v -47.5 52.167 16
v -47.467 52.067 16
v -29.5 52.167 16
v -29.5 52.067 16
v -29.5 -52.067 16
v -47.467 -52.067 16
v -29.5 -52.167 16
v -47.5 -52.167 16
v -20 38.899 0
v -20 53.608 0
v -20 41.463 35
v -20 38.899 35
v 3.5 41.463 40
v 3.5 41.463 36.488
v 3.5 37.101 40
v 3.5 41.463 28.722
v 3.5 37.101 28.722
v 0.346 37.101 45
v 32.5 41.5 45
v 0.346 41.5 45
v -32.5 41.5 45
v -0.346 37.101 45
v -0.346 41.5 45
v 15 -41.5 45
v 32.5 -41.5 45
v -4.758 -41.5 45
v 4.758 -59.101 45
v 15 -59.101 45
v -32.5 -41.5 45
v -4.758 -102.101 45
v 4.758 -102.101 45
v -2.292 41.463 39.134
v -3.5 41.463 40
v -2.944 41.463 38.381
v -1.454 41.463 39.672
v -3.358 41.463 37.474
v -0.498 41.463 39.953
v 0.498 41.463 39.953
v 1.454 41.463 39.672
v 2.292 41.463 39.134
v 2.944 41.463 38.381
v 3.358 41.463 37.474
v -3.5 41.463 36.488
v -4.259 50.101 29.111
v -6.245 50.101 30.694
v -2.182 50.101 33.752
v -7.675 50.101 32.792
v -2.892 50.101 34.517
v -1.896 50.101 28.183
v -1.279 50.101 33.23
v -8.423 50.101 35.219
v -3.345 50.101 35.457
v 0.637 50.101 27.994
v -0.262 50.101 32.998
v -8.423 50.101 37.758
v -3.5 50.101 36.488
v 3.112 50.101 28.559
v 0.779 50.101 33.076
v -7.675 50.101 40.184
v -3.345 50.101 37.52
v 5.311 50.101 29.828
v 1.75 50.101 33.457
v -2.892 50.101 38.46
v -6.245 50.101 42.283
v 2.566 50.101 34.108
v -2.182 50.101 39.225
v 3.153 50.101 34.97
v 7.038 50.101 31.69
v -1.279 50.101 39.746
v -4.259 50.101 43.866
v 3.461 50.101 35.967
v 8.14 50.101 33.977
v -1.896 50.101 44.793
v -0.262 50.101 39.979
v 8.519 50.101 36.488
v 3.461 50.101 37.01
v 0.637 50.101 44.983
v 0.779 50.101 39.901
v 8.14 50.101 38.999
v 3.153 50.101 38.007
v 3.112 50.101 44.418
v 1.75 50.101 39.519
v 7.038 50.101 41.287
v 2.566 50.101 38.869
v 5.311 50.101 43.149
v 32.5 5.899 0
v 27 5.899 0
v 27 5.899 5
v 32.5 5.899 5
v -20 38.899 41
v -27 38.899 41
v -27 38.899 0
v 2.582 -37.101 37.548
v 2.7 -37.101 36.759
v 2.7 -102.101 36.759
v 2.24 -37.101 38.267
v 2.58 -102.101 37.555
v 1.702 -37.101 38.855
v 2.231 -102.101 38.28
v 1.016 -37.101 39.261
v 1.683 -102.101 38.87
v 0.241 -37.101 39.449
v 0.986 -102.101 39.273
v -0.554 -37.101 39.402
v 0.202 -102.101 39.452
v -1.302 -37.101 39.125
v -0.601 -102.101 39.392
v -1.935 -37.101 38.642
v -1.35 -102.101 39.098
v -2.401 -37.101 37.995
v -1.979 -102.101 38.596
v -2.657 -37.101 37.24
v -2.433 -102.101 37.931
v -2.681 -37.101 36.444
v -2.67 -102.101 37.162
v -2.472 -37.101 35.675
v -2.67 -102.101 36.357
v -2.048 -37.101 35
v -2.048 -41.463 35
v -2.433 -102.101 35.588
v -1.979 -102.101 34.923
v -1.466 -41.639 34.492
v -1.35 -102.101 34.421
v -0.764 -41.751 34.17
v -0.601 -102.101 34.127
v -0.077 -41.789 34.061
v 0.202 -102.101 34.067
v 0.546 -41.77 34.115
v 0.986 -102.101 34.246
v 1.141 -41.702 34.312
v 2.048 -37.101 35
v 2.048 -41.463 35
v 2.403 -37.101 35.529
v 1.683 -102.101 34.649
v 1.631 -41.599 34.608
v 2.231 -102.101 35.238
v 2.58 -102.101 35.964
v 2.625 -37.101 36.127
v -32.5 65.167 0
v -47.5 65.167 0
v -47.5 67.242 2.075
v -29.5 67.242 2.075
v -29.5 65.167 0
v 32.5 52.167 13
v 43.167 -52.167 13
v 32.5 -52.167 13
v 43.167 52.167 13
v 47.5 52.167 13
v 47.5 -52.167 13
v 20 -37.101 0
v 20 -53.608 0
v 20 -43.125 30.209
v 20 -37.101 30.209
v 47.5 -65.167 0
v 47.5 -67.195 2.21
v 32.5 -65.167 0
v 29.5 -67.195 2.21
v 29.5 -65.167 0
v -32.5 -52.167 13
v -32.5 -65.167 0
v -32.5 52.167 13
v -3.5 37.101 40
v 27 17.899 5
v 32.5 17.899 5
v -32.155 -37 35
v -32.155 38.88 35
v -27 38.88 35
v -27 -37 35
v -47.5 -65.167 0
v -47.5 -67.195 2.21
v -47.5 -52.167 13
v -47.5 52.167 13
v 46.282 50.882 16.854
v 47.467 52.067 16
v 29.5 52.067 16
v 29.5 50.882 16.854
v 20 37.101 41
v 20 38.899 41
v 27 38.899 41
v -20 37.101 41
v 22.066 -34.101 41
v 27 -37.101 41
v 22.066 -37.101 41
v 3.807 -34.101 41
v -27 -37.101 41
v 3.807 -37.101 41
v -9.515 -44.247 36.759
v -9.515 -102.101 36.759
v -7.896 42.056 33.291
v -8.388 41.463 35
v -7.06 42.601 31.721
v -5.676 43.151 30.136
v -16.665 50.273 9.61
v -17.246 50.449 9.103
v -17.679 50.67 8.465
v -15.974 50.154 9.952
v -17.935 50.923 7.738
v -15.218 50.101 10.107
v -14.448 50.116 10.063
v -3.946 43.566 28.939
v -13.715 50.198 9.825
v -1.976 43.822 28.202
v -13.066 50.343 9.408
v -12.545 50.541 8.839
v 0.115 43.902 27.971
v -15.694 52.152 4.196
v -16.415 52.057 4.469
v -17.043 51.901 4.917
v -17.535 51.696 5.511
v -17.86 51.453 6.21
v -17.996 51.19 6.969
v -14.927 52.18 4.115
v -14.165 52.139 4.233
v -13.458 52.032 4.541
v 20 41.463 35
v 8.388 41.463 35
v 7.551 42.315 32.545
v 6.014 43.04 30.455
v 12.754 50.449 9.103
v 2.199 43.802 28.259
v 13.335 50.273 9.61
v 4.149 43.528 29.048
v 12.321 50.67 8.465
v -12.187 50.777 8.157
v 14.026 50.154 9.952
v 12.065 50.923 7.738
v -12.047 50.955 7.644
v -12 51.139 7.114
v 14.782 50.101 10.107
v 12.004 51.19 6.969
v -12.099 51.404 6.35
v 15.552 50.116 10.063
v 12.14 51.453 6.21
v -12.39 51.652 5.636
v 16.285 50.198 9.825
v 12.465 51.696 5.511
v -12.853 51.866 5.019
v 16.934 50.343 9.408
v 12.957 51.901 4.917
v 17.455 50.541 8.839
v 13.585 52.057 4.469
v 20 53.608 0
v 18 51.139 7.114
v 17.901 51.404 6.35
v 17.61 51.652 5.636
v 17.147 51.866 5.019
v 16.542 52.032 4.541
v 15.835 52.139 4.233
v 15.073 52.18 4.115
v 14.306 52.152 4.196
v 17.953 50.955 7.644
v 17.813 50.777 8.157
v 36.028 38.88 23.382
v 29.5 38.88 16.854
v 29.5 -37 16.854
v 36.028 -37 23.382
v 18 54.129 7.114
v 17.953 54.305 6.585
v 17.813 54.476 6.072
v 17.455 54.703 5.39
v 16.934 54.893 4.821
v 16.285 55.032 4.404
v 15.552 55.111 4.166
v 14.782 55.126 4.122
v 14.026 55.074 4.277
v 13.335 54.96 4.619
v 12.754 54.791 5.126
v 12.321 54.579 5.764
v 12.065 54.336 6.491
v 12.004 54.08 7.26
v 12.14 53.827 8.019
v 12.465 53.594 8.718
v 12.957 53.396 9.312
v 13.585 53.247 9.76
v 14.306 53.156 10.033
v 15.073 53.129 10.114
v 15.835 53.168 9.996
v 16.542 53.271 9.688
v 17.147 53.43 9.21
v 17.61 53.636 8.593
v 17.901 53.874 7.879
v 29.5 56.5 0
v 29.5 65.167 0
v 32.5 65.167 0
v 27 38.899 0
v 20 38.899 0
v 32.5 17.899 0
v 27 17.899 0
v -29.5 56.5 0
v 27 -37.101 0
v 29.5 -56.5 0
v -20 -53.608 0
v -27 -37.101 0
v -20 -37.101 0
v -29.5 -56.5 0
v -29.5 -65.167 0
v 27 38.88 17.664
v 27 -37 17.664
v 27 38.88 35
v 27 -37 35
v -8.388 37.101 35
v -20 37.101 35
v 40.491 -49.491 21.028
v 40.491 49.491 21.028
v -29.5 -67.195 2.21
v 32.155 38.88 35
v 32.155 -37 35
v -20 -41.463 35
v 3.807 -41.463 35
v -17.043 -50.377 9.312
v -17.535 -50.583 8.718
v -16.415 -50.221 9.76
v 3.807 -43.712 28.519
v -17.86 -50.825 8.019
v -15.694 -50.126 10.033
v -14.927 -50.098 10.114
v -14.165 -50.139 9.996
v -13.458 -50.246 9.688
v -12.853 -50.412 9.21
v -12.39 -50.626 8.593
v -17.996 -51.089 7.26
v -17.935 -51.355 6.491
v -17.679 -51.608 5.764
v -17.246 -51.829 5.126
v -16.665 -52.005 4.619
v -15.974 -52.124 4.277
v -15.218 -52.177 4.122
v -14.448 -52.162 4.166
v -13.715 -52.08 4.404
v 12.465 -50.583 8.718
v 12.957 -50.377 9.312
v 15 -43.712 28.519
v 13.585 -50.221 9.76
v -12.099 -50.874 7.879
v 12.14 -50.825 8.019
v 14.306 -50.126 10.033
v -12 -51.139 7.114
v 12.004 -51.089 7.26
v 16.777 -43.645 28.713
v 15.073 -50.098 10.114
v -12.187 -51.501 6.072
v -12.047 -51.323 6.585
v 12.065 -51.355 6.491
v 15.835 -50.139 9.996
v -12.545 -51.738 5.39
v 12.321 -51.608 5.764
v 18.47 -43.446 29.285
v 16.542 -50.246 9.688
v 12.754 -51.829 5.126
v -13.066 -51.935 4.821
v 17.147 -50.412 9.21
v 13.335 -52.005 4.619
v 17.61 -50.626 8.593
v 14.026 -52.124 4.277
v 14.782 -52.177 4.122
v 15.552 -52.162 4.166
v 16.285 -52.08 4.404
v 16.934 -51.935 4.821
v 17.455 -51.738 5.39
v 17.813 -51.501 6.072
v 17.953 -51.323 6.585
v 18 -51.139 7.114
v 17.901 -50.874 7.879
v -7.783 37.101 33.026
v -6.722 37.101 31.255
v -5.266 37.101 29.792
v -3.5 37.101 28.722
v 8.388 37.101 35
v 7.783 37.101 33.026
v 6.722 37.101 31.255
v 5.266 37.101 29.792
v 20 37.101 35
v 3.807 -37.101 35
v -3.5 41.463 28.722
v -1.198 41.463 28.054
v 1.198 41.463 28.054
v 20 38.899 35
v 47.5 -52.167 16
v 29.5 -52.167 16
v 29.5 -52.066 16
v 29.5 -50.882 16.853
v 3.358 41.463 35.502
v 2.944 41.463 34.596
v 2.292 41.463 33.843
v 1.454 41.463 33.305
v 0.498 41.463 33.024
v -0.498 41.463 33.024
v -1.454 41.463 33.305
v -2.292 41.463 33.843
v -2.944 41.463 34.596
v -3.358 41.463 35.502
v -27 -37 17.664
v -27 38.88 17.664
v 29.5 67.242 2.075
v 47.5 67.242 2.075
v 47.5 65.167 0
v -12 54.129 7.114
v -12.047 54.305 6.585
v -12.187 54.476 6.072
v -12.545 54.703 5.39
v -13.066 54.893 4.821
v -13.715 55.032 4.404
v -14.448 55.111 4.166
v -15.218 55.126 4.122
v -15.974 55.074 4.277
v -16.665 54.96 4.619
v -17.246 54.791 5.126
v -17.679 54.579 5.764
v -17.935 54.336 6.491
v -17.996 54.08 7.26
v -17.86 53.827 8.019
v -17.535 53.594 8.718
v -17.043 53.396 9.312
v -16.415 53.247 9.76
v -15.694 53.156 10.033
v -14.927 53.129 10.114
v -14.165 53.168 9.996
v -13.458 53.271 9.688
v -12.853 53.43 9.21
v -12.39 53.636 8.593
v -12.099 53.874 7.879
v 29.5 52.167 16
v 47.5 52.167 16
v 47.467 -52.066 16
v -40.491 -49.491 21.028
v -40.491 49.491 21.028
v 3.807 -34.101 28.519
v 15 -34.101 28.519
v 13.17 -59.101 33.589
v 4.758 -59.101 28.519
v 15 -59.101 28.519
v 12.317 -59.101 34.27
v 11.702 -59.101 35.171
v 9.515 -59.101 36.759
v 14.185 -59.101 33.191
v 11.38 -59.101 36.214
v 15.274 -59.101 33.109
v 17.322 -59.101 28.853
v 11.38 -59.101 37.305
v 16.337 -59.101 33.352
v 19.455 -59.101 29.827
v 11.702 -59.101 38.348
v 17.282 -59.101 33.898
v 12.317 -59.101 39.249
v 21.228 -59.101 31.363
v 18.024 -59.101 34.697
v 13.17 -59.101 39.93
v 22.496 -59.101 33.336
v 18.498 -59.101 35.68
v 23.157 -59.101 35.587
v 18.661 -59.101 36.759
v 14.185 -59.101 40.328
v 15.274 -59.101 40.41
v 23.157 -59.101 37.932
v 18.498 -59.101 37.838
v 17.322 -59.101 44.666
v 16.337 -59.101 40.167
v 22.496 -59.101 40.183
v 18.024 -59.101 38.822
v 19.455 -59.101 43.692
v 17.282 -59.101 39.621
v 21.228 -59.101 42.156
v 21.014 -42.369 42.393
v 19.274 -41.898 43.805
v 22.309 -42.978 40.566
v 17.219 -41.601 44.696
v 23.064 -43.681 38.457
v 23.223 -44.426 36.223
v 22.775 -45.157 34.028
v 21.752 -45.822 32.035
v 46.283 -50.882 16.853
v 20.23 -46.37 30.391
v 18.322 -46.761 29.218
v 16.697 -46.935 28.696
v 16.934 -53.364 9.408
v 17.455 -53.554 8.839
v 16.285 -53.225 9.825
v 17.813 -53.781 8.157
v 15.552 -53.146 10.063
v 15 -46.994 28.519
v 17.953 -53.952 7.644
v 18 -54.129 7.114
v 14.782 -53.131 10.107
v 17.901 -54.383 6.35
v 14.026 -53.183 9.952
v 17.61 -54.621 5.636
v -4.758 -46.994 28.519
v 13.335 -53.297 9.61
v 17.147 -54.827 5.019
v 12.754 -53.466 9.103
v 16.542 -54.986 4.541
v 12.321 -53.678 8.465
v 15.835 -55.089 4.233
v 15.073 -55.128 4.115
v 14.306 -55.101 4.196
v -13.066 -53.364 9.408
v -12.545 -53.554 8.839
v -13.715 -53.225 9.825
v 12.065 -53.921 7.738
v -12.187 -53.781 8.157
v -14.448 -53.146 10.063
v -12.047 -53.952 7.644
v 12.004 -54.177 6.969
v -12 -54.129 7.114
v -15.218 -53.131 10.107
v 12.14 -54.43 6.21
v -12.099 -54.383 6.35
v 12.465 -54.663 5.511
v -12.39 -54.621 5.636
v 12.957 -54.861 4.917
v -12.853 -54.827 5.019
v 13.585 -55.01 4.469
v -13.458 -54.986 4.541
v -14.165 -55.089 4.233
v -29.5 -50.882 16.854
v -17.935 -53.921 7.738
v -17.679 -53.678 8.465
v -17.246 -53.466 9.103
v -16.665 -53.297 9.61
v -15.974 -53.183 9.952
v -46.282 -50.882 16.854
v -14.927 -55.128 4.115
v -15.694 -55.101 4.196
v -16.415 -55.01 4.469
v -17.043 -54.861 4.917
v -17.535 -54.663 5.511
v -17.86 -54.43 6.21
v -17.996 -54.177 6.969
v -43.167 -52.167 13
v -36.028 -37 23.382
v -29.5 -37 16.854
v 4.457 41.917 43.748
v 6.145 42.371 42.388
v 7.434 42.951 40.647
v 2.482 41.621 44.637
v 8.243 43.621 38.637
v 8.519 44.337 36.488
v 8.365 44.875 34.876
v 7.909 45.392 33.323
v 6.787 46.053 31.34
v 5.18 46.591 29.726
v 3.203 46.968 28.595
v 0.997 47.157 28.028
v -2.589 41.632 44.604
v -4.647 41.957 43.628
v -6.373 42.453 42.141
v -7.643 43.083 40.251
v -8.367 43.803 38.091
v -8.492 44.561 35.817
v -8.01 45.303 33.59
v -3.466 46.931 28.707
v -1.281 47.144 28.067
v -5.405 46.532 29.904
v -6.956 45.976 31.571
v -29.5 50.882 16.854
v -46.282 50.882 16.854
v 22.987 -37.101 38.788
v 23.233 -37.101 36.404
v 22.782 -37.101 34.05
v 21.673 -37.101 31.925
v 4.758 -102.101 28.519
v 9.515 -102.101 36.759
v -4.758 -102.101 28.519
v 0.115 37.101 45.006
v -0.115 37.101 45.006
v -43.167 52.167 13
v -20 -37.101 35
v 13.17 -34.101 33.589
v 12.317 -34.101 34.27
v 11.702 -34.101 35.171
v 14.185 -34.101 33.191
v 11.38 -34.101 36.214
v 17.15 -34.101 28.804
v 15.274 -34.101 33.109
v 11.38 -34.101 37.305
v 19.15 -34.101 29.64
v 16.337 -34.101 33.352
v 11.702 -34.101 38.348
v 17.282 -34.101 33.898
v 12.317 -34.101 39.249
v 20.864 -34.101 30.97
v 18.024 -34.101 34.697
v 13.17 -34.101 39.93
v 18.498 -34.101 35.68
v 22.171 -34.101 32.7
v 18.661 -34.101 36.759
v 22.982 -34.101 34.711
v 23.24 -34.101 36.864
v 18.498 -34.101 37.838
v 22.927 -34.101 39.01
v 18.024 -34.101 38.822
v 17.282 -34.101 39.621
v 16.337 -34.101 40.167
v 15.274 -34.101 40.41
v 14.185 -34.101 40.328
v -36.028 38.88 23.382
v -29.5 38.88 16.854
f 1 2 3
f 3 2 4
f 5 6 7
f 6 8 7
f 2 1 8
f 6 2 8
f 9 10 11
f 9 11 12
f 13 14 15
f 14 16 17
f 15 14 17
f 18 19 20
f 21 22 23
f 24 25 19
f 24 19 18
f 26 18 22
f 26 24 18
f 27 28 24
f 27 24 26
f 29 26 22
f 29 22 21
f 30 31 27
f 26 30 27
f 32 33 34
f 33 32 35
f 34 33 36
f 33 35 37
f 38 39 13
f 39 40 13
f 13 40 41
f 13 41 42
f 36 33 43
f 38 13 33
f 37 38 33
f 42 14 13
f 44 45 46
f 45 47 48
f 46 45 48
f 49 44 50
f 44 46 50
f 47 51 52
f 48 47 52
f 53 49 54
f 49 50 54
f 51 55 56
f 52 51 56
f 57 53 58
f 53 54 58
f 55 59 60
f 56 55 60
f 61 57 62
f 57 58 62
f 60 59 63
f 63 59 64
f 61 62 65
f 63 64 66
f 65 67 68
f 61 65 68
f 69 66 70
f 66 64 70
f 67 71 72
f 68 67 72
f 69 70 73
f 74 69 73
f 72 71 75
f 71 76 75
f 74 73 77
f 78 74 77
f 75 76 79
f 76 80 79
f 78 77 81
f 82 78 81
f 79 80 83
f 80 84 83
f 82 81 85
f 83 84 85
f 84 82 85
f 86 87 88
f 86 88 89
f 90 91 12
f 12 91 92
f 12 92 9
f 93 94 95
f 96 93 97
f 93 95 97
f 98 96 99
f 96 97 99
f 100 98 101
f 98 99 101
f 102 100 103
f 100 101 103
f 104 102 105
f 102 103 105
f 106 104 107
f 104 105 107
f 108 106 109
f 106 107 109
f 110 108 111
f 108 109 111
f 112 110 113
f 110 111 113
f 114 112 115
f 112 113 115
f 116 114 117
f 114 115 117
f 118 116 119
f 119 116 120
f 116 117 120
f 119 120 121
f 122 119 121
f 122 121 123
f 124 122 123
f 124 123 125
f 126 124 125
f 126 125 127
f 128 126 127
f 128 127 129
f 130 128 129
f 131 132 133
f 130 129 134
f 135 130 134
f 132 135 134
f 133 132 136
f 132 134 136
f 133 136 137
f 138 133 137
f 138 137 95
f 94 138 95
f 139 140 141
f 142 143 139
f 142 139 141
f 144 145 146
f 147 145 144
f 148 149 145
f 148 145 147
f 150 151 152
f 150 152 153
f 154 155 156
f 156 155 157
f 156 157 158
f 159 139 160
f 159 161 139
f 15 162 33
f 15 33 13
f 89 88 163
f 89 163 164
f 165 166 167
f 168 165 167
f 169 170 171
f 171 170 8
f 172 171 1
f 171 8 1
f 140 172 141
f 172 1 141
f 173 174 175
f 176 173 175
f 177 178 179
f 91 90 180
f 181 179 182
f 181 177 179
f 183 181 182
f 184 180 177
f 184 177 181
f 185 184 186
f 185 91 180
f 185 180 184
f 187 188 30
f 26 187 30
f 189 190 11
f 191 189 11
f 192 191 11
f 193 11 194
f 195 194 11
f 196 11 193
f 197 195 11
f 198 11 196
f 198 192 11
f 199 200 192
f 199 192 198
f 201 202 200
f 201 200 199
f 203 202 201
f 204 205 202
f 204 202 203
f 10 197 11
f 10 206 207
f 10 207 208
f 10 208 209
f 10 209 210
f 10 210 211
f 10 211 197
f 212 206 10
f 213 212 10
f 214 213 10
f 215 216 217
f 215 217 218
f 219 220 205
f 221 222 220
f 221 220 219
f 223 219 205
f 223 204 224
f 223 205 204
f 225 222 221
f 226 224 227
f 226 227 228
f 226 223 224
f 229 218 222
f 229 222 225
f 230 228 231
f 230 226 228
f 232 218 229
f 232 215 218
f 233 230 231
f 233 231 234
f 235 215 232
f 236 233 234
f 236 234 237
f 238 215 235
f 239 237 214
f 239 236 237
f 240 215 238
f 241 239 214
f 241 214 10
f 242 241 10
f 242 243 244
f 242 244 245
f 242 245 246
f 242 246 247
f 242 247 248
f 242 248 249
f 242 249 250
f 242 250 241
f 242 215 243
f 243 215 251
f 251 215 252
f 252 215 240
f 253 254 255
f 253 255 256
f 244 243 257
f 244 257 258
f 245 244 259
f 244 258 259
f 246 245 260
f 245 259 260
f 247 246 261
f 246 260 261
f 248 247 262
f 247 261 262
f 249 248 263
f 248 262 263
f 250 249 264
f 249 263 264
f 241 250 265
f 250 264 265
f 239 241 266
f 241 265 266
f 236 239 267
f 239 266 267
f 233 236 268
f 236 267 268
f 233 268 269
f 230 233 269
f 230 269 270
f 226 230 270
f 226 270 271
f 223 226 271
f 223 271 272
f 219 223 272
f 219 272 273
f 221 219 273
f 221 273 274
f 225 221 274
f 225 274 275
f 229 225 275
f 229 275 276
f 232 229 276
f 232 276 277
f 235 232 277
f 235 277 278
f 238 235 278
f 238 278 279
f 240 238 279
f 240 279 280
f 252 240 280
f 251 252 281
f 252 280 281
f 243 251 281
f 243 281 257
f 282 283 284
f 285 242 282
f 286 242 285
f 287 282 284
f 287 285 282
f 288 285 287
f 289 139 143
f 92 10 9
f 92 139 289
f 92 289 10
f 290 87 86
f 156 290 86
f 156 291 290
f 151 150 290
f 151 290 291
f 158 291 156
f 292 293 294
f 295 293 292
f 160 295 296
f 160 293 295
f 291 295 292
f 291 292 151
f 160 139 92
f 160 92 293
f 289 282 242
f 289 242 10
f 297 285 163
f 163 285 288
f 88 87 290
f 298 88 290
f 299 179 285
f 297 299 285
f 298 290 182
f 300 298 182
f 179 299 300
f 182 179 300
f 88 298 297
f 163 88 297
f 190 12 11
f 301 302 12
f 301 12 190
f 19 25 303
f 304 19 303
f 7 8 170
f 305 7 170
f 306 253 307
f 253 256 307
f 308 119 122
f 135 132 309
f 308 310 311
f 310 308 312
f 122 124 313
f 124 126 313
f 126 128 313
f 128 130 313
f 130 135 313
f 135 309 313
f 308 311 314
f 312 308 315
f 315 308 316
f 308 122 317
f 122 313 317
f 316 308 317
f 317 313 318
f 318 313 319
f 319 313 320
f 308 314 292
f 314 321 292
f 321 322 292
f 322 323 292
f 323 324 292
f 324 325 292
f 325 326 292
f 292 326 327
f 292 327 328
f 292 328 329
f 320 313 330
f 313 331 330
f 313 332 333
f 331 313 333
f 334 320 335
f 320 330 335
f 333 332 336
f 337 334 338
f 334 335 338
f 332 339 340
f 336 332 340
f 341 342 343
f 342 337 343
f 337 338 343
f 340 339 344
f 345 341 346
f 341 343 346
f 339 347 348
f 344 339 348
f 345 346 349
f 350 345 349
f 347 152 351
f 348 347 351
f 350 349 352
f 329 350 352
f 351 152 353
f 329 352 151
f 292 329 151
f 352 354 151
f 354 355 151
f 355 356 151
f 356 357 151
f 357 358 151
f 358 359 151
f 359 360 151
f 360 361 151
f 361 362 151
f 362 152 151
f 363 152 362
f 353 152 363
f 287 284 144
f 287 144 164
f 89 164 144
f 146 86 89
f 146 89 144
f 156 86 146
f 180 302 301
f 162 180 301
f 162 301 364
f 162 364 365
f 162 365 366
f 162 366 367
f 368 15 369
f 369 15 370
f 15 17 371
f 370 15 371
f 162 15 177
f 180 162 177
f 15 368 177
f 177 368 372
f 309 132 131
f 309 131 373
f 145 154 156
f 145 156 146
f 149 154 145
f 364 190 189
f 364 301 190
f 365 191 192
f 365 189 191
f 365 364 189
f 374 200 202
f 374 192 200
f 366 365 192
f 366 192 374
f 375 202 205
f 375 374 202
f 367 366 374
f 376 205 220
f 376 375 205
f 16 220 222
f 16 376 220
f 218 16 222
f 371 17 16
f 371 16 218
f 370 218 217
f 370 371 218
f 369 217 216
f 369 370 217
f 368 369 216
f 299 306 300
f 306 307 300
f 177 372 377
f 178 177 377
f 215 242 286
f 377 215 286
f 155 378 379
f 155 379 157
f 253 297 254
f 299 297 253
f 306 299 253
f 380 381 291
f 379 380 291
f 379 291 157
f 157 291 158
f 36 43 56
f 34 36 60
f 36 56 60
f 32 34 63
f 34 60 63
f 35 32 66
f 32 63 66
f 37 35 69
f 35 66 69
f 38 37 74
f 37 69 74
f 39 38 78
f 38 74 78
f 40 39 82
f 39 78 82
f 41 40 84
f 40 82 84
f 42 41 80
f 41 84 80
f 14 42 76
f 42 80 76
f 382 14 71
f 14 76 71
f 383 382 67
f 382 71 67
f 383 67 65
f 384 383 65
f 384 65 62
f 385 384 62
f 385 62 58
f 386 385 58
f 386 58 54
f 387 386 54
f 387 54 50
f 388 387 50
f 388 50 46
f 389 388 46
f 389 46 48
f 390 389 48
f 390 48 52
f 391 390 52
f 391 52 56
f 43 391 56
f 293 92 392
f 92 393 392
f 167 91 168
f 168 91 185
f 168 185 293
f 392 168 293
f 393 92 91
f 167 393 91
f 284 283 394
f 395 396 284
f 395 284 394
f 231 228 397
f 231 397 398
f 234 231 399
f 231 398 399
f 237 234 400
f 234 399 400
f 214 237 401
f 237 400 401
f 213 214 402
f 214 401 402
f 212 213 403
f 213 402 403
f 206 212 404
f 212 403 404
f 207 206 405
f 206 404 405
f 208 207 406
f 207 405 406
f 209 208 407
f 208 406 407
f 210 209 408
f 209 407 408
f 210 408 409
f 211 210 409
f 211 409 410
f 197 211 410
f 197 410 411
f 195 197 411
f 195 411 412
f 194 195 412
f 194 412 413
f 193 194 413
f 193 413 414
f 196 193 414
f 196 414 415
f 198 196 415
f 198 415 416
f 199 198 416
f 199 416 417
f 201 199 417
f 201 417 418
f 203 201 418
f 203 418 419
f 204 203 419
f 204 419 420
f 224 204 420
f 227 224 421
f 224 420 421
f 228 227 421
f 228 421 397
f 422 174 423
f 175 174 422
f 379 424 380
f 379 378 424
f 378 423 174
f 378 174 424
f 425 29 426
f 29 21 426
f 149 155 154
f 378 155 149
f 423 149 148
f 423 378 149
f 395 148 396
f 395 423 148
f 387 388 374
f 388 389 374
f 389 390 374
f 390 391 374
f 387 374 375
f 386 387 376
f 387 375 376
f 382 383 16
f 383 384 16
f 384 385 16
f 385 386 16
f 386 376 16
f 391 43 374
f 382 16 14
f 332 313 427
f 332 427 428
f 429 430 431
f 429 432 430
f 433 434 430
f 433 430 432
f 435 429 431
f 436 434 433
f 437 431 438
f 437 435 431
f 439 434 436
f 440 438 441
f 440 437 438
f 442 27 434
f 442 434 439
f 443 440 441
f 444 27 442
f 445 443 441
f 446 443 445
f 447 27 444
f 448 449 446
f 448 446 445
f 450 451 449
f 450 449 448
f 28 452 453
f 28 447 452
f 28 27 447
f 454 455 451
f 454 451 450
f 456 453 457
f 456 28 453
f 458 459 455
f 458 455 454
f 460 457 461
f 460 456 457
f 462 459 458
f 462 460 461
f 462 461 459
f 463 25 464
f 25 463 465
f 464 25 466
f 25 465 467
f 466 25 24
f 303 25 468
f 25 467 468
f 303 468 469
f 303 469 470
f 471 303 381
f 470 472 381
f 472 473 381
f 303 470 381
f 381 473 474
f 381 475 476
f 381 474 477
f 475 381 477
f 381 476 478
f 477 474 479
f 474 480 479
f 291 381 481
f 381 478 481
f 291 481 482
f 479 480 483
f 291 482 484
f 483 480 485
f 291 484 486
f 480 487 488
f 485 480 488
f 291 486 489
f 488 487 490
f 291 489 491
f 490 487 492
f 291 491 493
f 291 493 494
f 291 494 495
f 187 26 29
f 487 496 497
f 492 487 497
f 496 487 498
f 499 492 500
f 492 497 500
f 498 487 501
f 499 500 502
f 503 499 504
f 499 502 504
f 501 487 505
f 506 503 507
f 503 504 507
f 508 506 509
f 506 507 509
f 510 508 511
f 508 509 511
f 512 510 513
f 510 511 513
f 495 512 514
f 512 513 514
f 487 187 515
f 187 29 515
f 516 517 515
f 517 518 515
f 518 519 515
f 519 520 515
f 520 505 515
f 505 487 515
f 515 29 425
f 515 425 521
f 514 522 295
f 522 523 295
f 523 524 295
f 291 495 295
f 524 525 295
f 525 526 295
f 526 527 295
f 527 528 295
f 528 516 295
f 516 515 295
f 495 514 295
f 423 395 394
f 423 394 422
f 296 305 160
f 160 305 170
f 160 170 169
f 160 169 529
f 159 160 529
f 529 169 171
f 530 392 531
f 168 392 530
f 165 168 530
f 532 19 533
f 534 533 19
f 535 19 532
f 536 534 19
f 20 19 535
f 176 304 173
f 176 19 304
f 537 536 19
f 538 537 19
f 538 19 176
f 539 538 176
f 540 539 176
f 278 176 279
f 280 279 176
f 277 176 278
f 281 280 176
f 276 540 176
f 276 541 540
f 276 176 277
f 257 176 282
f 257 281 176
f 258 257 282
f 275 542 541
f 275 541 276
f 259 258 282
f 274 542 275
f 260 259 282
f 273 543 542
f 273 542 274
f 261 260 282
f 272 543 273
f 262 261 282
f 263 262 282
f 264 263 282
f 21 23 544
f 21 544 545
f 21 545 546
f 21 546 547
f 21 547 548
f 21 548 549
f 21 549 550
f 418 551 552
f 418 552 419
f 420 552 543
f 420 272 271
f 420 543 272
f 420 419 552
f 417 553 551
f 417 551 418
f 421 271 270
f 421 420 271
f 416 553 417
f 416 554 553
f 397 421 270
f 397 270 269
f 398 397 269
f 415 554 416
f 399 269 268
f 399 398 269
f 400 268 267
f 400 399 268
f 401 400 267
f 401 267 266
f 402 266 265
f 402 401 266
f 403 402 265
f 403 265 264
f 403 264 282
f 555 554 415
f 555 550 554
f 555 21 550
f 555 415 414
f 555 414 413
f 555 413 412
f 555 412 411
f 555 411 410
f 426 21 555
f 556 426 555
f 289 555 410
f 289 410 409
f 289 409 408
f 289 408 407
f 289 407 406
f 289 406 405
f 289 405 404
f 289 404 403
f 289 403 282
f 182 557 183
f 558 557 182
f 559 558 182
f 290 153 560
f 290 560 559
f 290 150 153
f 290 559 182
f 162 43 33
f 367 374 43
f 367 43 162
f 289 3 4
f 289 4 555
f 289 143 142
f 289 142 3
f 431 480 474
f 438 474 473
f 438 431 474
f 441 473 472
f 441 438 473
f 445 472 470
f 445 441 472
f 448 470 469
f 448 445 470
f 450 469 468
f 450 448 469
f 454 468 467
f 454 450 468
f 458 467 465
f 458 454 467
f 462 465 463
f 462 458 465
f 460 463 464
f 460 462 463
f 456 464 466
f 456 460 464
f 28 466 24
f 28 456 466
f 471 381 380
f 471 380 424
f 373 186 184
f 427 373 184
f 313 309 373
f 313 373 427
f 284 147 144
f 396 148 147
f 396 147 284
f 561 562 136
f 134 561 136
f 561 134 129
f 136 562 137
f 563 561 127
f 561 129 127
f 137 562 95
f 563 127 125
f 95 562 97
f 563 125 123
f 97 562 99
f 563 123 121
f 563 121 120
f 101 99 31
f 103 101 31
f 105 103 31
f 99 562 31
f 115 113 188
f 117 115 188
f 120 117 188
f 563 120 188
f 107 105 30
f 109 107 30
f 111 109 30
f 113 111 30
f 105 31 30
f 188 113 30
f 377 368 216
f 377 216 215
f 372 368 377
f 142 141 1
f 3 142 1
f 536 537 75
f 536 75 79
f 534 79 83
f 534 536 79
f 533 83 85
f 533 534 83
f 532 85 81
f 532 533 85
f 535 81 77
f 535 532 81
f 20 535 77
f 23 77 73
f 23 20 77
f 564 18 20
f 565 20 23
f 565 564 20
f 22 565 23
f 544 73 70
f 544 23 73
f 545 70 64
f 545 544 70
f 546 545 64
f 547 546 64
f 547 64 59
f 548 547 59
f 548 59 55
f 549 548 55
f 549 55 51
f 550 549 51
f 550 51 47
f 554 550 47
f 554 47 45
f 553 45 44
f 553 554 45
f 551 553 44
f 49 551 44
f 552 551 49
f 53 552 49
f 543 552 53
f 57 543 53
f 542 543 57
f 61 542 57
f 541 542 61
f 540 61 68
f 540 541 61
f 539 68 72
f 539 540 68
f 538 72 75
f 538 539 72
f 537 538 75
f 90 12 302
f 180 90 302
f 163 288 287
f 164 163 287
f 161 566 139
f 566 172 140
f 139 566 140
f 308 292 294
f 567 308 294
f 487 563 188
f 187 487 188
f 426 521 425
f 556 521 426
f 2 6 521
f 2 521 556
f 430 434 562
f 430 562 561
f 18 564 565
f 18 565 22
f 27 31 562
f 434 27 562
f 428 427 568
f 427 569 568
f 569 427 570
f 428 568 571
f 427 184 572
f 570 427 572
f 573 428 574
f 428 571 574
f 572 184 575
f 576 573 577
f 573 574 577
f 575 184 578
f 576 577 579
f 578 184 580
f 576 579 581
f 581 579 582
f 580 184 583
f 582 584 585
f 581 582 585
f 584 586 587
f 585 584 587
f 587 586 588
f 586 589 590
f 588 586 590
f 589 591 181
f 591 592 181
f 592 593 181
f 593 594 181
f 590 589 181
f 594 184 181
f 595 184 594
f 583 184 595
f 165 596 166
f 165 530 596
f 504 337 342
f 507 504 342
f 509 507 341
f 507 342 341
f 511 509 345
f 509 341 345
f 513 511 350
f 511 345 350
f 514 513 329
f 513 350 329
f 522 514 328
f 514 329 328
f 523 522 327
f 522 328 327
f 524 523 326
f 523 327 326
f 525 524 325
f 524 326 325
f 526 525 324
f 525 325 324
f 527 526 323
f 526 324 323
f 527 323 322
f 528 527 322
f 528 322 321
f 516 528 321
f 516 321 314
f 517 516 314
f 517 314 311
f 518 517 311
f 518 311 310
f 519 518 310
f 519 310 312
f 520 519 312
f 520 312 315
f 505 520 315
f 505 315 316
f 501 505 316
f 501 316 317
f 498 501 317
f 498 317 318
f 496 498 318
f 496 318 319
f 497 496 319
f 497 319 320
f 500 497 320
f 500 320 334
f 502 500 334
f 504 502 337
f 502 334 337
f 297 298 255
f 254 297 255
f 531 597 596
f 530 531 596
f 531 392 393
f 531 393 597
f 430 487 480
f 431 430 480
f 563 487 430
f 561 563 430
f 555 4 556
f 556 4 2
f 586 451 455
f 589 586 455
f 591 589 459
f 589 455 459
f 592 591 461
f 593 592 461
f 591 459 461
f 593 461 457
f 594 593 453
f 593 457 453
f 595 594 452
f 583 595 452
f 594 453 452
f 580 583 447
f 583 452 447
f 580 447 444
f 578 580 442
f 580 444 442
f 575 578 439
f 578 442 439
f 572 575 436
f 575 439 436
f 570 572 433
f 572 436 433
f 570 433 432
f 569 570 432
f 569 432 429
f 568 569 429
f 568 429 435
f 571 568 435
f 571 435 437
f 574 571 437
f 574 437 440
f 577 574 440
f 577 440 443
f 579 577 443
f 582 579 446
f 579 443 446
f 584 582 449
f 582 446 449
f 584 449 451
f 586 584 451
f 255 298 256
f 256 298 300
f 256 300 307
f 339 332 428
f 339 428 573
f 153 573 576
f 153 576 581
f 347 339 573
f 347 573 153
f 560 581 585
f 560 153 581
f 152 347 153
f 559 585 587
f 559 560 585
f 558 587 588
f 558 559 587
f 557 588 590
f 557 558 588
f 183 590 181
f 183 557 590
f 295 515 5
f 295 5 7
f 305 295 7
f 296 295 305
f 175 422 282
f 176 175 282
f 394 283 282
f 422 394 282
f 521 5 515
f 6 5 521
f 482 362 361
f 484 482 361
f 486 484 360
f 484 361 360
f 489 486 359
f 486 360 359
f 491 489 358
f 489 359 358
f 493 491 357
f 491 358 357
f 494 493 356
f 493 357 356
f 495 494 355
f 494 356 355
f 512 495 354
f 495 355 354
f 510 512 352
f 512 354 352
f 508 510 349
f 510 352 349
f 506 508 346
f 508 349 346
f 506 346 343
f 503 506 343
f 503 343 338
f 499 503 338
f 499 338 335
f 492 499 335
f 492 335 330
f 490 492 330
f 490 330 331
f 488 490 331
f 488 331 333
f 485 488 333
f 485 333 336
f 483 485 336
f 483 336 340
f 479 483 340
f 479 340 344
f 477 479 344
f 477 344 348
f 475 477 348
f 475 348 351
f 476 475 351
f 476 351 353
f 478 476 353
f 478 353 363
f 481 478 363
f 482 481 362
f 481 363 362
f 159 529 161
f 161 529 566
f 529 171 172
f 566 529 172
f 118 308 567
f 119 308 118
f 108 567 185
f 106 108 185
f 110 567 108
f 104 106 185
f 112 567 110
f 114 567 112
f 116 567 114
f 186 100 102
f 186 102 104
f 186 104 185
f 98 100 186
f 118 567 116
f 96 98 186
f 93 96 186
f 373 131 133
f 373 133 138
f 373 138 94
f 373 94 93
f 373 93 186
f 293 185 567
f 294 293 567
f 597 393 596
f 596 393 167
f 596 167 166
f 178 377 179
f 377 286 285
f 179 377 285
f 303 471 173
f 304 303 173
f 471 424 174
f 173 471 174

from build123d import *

# Parameters (mm, degrees)
SKETCH_W             = 65
SKETCH_H             = 83
PAD_DEPTH            = 45
SKETCH001_W          = 83
SKETCH001_H          = 32
PAD001_DEPTH         = 15
PAD002_DEPTH         = 15
POCKET_DEPTH         = 403.6691065481
POCKET001_DEPTH      = 500
POCKET001_DEPTH_BACK = 100
PAD003_DEPTH         = 16
SKETCH007_W          = 3
SKETCH007_H          = 135.5960614908
PAD004_DEPTH         = 16
POCKET002_DEPTH      = 414.7315387876
POCKET003_DEPTH      = 5
SKETCH008_W          = 54
SKETCH008_H          = 76
POCKET004_DEPTH      = 35
PAD005_DEPTH         = 65
CHAMFER_SIZE         = 5.3
CHAMFER001_SIZE      = 5.3
CHAMFER002_SIZE      = 0.8999
CHAMFER003_SIZE      = 0.899
CHAMFER004_SIZE      = 0.8999
CHAMFER005_SIZE      = 0.8999
POCKET005_DEPTH      = 80.0010001
POCKET006_DEPTH      = 80.0010001
POCKET007_DEPTH      = 10000
POCKET007_DEPTH_BACK = 100
POCKET008_DEPTH      = 95.001
SKETCH012_W          = 5.5
SKETCH012_H          = 12
POCKET009_DEPTH      = 5
POCKET010_DEPTH      = 20
POCKET010_DEPTH_BACK = 20
POCKET011_DEPTH      = 6
SKETCH014_R          = 8.518625
PAD006_DEPTH         = 13
SKETCH015_R          = 3.5
POCKET012_DEPTH      = 15
SKETCH016_R          = 0.75
POCKET013_DEPTH      = 40
SKETCH018_W          = 5.5
SKETCH018_H          = 12
POCKET014_DEPTH      = 5
POCKET014_FACE131_W  = 12
POCKET014_FACE131_H  = 5.5
PAD007_DEPTH         = 5
POCKET015_DEPTH      = 38.88
POCKET015_DEPTH_BACK = 37
SKETCH020_R          = 3
POCKET016_DEPTH      = 173.1015589479
SKETCH021_R          = 2.7
POCKET017_DEPTH      = 70
SKETCH022_R          = 3.6
PAD008_DEPTH         = 25
SKETCH023_R          = 3.660532
POCKET018_DEPTH      = 25
SKETCH024_W          = 7
SKETCH024_H          = 6.387993
POCKET019_DEPTH      = 40


with BuildPart() as part:
    # Sketch → Pad (new body)
    with BuildSketch(Plane.XY):
        Rectangle(SKETCH_W, SKETCH_H)
    extrude(amount=PAD_DEPTH)

    # Sketch001 (on Face4 of Pad) → Pad001 (join)
    with BuildSketch(Plane(origin=(-32.5, 0, 0), x_dir=(0, -1, 0), z_dir=(-1, 0, 0))):
        with Locations((0, 29)):
            Rectangle(SKETCH001_W, SKETCH001_H)
    pad001 = extrude(amount=PAD001_DEPTH)

    # Mirrored: Pad001 across YZ
    add(pad001.mirror(Plane.YZ))

    # Sketch002 (on Face4 of Mirrored) → Pad002 (join)
    with BuildSketch(Plane.XZ.offset(41.5)):
        Polygon((-47.5, 45), (47.5, 45), (47.5, 13), (32.5, 13), (32.5, 0), (-32.5, 0), (-32.5, 13), (-47.5, 13), align=None)
    pad002 = extrude(amount=PAD002_DEPTH)

    # Mirrored001: Pad002 across XZ
    add(pad002.mirror(Plane.XZ))

    # Sketch003 (on Face13 of Mirrored001) → Pocket (cut, through all)
    with BuildSketch(Plane(origin=(-47.5, 0, 0), x_dir=(0, -1, 0), z_dir=(-1, 0, 0))):
        Polygon((41.5, 45), (56.5, 0), (69.973511, 50.863071), align=None)
    pocket = extrude(amount=-POCKET_DEPTH, mode=Mode.SUBTRACT)

    # Mirrored002: Pocket across XZ
    add(pocket.mirror(Plane.XZ), mode=Mode.SUBTRACT)

    # Sketch004 → Pocket001 (cut, two sides)
    with BuildSketch(Plane.XZ) as pocket001_sk:
        Polygon((-32.5, 45), (-47.5, 0), (-68.972275, 31.059837), (-58.790833, 51.045628), align=None)
    pocket001 = extrude(amount=-POCKET001_DEPTH, mode=Mode.SUBTRACT) + extrude(pocket001_sk.sketch, amount=POCKET001_DEPTH_BACK, mode=Mode.SUBTRACT)

    # Mirrored003: Pocket001 across YZ
    add(pocket001.mirror(Plane.YZ), mode=Mode.SUBTRACT)

    # Sketch006 (on DatumPlane) → Pad003 (join)
    with BuildSketch(Plane(origin=(-47.5, 0, 4), x_dir=(0, -1, 0), z_dir=(-1, 0, 0))):
        Polygon((-68.401131891, -2.9951612268), (-52.1666666667, 12), (52.1666666667, 12), (67.1949295998, -1.7895363668), (65.1666666666, -4), (52.1666666667, 9), (-52.1666666667, 9), (-66.3655953138, -5.1989286472), align=None)
    pad003 = extrude(amount=-PAD003_DEPTH)

    # Sketch007 (on Face8 of Pad003) → Pad004 (join)
    with BuildSketch(Plane(origin=(0, 0, 0), x_dir=(1, 0, 0), z_dir=(0, 0, -1))):
        with Locations((-31, -0.6031011456)):
            Rectangle(SKETCH007_W, SKETCH007_H)
    pad004 = extrude(amount=-PAD004_DEPTH)

    # Pad004 Face41 → Pocket002 (cut, through all)
    with BuildSketch(Plane(origin=(-32.5, 62.9896434829, 11.0016129244), x_dir=(0, 1, 0), z_dir=(-1, 0, 0))):
        Polygon((5.4114884081, -4.9983870756), (5.4114884081, 9.9967741512), (-10.8229768162, -4.9983870756), align=None)
    pocket002 = extrude(amount=-POCKET002_DEPTH, mode=Mode.SUBTRACT)

    # Pocket002 Face27 → Pocket003 (cut)
    with BuildSketch(Plane(origin=(-32.5, -62.1855086221, 11.4034878777), x_dir=(0, 1, 0), z_dir=(-1, 0, 0))):
        Polygon((10.0188419554, -4.5965121223), (-5.0094209777, 9.1930242445), (-5.0094209777, -4.5965121223), align=None)
    pocket003 = extrude(amount=-POCKET003_DEPTH, mode=Mode.SUBTRACT)

    # Mirrored004: Pad003 across YZ
    add(pad003.mirror(Plane.YZ))

    # Mirrored005: Pad004 across YZ
    add(pad004.mirror(Plane.YZ))

    # Mirrored006: Pocket002 across YZ
    add(pocket002.mirror(Plane.YZ), mode=Mode.SUBTRACT)

    # Mirrored007: Pocket003 across YZ
    add(pocket003.mirror(Plane.YZ), mode=Mode.SUBTRACT)

    # Sketch008 (on Face8 of Mirrored007) → Pocket004 (cut)
    with BuildSketch(Plane(origin=(0, 0, 0), x_dir=(1, 0, 0), z_dir=(0, 0, -1))):
        with Locations((0, -0.8994410524)):
            Rectangle(SKETCH008_W, SKETCH008_H)
    extrude(amount=-POCKET004_DEPTH, mode=Mode.SUBTRACT)

    # Sketch009 (on Face24 of Pocket004) → Pad005 (join)
    with BuildSketch(Plane(origin=(0, -37.1005589476, 0), x_dir=(-1, 0, 0), z_dir=(0, 1, 0))):
        Polygon((-4.7576784019, 45), (-9.5153568039, 36.7594592818), (-4.7576784019, 28.5189185635), (4.7576784019, 28.5189185635), (9.5153568039, 36.7594592818), (4.7576784019, 45), align=None)
    extrude(amount=-PAD005_DEPTH)

    # Chamfer
    chamfer_edges = [part.edges().sort_by_distance(p)[0] for p in [
        (42.166667, 0, 16),
    ]]
    chamfer(chamfer_edges, length=CHAMFER_SIZE)

    # Chamfer001
    chamfer001_edges = [part.edges().sort_by_distance(p)[0] for p in [
        (-42.166667, 0, 16),
    ]]
    chamfer(chamfer001_edges, length=CHAMFER001_SIZE)

    # Chamfer002
    chamfer002_edges = [part.edges().sort_by_distance(p)[0] for p in [
        (-44.816667, -51.166667, 16),
        (-37.333333, -51.166667, 16),
        (-32, -51.166667, 16),
        (-30.5, -51.166667, 16),
    ]]
    chamfer(chamfer002_edges, length=CHAMFER002_SIZE)

    # Chamfer003
    chamfer003_edges = [part.edges().sort_by_distance(p)[0] for p in [
        (30.5, -51.166667, 16),
        (32, -51.166667, 16),
        (37.333333, -51.166667, 16),
        (44.816667, -51.166667, 16),
    ]]
    chamfer(chamfer003_edges, length=CHAMFER003_SIZE)

    # Chamfer004
    chamfer004_edges = [part.edges().sort_by_distance(p)[0] for p in [
        (-30.5, 51.166667, 16),
        (-32, 51.166667, 16),
        (-37.333333, 51.166667, 16),
        (-44.816667, 51.166667, 16),
    ]]
    chamfer(chamfer004_edges, length=CHAMFER004_SIZE)

    # Chamfer005
    chamfer005_edges = [part.edges().sort_by_distance(p)[0] for p in [
        (44.816667, 51.166667, 16),
        (37.333333, 51.166667, 16),
        (32, 51.166667, 16),
        (30.5, 51.166667, 16),
    ]]
    chamfer(chamfer005_edges, length=CHAMFER005_SIZE)

    # Chamfer005 Face72 → Pocket005 (cut, through all)
    with BuildSketch(Plane(origin=(-32.5, 68.0917547069, 0.3349462577), x_dir=(0, 1, 0), z_dir=(-1, 0, 0))):
        Polygon((0.3093771841, 0.3349462577), (-0.6187543683, 0.3349462577), (0.3093771841, -0.6698925155), align=None)
    extrude(amount=-POCKET005_DEPTH, mode=Mode.SUBTRACT)

    # Pocket005 Face105 → Pocket006 (cut, through all)
    with BuildSketch(Plane(origin=(-32.5, -66.5188419554, 0.7368212111), x_dir=(0, 1, 0), z_dir=(-1, 0, 0))):
        Polygon((-0.6760876444, -1.4736424221), (1.3521752888, 0.7368212111), (-0.6760876444, 0.7368212111), align=None)
    extrude(amount=-POCKET006_DEPTH, mode=Mode.SUBTRACT)

    # Pocket006 Face73 → Pocket007 (cut, two sides)
    with BuildSketch(Plane(origin=(-31.5, 66.3350874397, -0.3996428824), x_dir=(0, -1, 0), z_dir=(1, 0, 0))) as pocket007_sk:
        Polygon((1.168420773, -0.3996428824), (-0.0305078741, 0.7992857648), (-1.1379128989, -0.3996428824), align=None)
    extrude(amount=-POCKET007_DEPTH, mode=Mode.SUBTRACT)
    extrude(pocket007_sk.sketch, amount=POCKET007_DEPTH_BACK, mode=Mode.SUBTRACT)

    # Sketch011 (on Face39 of Pocket007) → Pocket008 (cut, through all)
    with BuildSketch(Plane.YZ.offset(47.5)):
        Polygon((65.1666666667, 0), (68.818161, 3.6514943333), (70.985268, 1.013342), (68.517616, -0.789946), align=None)
    extrude(amount=-POCKET008_DEPTH, mode=Mode.SUBTRACT)

    # Sketch012 (on Face30 of Pocket008) → Pocket009 (cut)
    with BuildSketch(Plane(origin=(0, 0, 0), x_dir=(1, 0, 0), z_dir=(0, 0, -1))):
        with Locations((-29.75, -11.8994410524)):
            Rectangle(SKETCH012_W, SKETCH012_H)
    extrude(amount=-POCKET009_DEPTH, mode=Mode.SUBTRACT)

    # Sketch013 → Pocket010 (cut, two sides)
    with BuildSketch(Plane.YZ) as pocket010_sk:
        Polygon((-37.1005589476, 35), (-41.46302, 35), (-53.607724, 0), (-37.1005589476, 0), align=None)
    pocket010 = extrude(amount=-POCKET010_DEPTH, mode=Mode.SUBTRACT) + extrude(pocket010_sk.sketch, amount=POCKET010_DEPTH_BACK, mode=Mode.SUBTRACT)

    # Mirrored008: Pocket010 across XZ
    add(pocket010.mirror(Plane.XZ), mode=Mode.SUBTRACT)

    # Mirrored008 Face101 → Pocket011 (cut)
    with BuildSketch(Plane(origin=(0, 0.2373498677, 35), x_dir=(0, -1, 0), z_dir=(0, 0, -1))):
        Polygon((37.3379088153, 27), (-38.6620911847, 27), (-38.6620911847, 20), (-36.86320908, 20), (-36.86320908, -20), (-38.6620911847, -20), (-38.6620911847, -27), (37.3379088153, -27), (37.3379088153, -20), (37.3379088153, -8.4995325139), (37.3379088153, 8.4995325139), (37.3379088153, 20), align=None)
    extrude(amount=-POCKET011_DEPTH, mode=Mode.SUBTRACT)

    # Sketch014 (on Face128 of Pocket011) → Pad006 (join)
    with BuildSketch(Plane.XZ.offset(-37.1005589476)):
        with Locations((0, 36.4884)):
            Circle(SKETCH014_R)
    extrude(amount=-PAD006_DEPTH)

    # Sketch015 (on Face43 of Pad006) → Pocket012 (cut)
    with BuildSketch(Plane(origin=(0, 50.1005589476, 0), x_dir=(-1, 0, 0), z_dir=(0, 1, 0))):
        with Locations((0, 36.4884)):
            Circle(SKETCH015_R)
    extrude(amount=-POCKET012_DEPTH, mode=Mode.SUBTRACT)

    # Sketch016 (on Face67 of Pocket012) → Pocket013 (cut)
    with BuildSketch(Plane.XZ.offset(102.1005589476)):
        with Locations((0, 57.966855919)):
            Circle(SKETCH016_R)
    extrude(amount=-POCKET013_DEPTH, mode=Mode.SUBTRACT)

    # Sketch018 → Pocket014 (cut)
    with BuildSketch(Plane(origin=(0, 0, 0), x_dir=(1, 0, 0), z_dir=(0, 0, -1))):
        with Locations((29.75, -11.8994410524)):
            Rectangle(SKETCH018_W, SKETCH018_H)
    extrude(amount=-POCKET014_DEPTH, mode=Mode.SUBTRACT)

    # Pocket014 Face131 → Pad007 (add)
    with BuildSketch(Plane(origin=(-29.75, 11.8994410524, 5), x_dir=(0, -1, 0), z_dir=(0, 0, -1))):
        Rectangle(POCKET014_FACE131_W, POCKET014_FACE131_H)
    extrude(amount=PAD007_DEPTH)

    # Sketch019 → Pocket015 (cut, two sides)
    with BuildSketch(Plane.XZ) as pocket015_sk:
        Polygon((-29.5, 16.8537200999), (-36.0278850321, 23.381605132), (-32.1550867428, 35), (-27, 35), (-23.389076, 18.833223), align=None)
    pocket015 = extrude(amount=-POCKET015_DEPTH, mode=Mode.SUBTRACT) + extrude(pocket015_sk.sketch, amount=POCKET015_DEPTH_BACK, mode=Mode.SUBTRACT)

    # Mirrored009: Pocket015 across YZ
    add(pocket015.mirror(Plane.YZ), mode=Mode.SUBTRACT)

    # Sketch020 (on DatumPlane) → Pocket016 (cut, through all)
    with BuildSketch(Plane(origin=(0, 71, 34), x_dir=(1, 0, 0), z_dir=(0, 1, 0))):
        with Locations((-15, 26.885509115)):
            Circle(SKETCH020_R)
        with Locations((15, 26.885509115)):
            Circle(SKETCH020_R)
    extrude(amount=-POCKET016_DEPTH, mode=Mode.SUBTRACT)

    # Sketch021 (on Face71 of Pocket016) → Pocket017 (cut)
    with BuildSketch(Plane.XZ.offset(102.1005589476)):
        with Locations((0, 36.7594592818)):
            Circle(SKETCH021_R)
    extrude(amount=-POCKET017_DEPTH, mode=Mode.SUBTRACT)

    # Sketch022 (on DatumPlane) → Pad008 (join)
    with BuildSketch(Plane(origin=(15, -59.1005589476, 12), x_dir=(1, 0, 0), z_dir=(0, -1, 0))):
        with BuildLine():
            ThreePointArc((0, 16.5189185635), (8.2405407182, 24.7594592818), (0, 33))
            Line((0, 33), (-11.193171, 33))
            Line((-11.193171, 33), (-11.193171, 16.5189185635))
            Line((-11.193171, 16.5189185635), (0, 16.5189185635))
        make_face()
        with Locations((0, 24.7594592818)):
            Circle(SKETCH022_R, mode=Mode.SUBTRACT)
    extrude(amount=-PAD008_DEPTH)

    # Sketch023 (on Face73 of Pad008) → Pocket018 (cut)
    with BuildSketch(Plane.XZ.offset(59.1005589476)):
        with Locations((15, 36.7594592818)):
            Circle(SKETCH023_R)
    extrude(amount=-POCKET018_DEPTH, mode=Mode.SUBTRACT)

    # Sketch024 (on Face13 of Pocket018) → Pocket019 (cut)
    with BuildSketch(Plane(origin=(0, 0, 0), x_dir=(1, 0, 0), z_dir=(0, 0, -1))):
        with Locations((0, -38.2690235)):
            Rectangle(SKETCH024_W, SKETCH024_H)
    extrude(amount=-POCKET019_DEPTH, mode=Mode.SUBTRACT)


solid = part.part
